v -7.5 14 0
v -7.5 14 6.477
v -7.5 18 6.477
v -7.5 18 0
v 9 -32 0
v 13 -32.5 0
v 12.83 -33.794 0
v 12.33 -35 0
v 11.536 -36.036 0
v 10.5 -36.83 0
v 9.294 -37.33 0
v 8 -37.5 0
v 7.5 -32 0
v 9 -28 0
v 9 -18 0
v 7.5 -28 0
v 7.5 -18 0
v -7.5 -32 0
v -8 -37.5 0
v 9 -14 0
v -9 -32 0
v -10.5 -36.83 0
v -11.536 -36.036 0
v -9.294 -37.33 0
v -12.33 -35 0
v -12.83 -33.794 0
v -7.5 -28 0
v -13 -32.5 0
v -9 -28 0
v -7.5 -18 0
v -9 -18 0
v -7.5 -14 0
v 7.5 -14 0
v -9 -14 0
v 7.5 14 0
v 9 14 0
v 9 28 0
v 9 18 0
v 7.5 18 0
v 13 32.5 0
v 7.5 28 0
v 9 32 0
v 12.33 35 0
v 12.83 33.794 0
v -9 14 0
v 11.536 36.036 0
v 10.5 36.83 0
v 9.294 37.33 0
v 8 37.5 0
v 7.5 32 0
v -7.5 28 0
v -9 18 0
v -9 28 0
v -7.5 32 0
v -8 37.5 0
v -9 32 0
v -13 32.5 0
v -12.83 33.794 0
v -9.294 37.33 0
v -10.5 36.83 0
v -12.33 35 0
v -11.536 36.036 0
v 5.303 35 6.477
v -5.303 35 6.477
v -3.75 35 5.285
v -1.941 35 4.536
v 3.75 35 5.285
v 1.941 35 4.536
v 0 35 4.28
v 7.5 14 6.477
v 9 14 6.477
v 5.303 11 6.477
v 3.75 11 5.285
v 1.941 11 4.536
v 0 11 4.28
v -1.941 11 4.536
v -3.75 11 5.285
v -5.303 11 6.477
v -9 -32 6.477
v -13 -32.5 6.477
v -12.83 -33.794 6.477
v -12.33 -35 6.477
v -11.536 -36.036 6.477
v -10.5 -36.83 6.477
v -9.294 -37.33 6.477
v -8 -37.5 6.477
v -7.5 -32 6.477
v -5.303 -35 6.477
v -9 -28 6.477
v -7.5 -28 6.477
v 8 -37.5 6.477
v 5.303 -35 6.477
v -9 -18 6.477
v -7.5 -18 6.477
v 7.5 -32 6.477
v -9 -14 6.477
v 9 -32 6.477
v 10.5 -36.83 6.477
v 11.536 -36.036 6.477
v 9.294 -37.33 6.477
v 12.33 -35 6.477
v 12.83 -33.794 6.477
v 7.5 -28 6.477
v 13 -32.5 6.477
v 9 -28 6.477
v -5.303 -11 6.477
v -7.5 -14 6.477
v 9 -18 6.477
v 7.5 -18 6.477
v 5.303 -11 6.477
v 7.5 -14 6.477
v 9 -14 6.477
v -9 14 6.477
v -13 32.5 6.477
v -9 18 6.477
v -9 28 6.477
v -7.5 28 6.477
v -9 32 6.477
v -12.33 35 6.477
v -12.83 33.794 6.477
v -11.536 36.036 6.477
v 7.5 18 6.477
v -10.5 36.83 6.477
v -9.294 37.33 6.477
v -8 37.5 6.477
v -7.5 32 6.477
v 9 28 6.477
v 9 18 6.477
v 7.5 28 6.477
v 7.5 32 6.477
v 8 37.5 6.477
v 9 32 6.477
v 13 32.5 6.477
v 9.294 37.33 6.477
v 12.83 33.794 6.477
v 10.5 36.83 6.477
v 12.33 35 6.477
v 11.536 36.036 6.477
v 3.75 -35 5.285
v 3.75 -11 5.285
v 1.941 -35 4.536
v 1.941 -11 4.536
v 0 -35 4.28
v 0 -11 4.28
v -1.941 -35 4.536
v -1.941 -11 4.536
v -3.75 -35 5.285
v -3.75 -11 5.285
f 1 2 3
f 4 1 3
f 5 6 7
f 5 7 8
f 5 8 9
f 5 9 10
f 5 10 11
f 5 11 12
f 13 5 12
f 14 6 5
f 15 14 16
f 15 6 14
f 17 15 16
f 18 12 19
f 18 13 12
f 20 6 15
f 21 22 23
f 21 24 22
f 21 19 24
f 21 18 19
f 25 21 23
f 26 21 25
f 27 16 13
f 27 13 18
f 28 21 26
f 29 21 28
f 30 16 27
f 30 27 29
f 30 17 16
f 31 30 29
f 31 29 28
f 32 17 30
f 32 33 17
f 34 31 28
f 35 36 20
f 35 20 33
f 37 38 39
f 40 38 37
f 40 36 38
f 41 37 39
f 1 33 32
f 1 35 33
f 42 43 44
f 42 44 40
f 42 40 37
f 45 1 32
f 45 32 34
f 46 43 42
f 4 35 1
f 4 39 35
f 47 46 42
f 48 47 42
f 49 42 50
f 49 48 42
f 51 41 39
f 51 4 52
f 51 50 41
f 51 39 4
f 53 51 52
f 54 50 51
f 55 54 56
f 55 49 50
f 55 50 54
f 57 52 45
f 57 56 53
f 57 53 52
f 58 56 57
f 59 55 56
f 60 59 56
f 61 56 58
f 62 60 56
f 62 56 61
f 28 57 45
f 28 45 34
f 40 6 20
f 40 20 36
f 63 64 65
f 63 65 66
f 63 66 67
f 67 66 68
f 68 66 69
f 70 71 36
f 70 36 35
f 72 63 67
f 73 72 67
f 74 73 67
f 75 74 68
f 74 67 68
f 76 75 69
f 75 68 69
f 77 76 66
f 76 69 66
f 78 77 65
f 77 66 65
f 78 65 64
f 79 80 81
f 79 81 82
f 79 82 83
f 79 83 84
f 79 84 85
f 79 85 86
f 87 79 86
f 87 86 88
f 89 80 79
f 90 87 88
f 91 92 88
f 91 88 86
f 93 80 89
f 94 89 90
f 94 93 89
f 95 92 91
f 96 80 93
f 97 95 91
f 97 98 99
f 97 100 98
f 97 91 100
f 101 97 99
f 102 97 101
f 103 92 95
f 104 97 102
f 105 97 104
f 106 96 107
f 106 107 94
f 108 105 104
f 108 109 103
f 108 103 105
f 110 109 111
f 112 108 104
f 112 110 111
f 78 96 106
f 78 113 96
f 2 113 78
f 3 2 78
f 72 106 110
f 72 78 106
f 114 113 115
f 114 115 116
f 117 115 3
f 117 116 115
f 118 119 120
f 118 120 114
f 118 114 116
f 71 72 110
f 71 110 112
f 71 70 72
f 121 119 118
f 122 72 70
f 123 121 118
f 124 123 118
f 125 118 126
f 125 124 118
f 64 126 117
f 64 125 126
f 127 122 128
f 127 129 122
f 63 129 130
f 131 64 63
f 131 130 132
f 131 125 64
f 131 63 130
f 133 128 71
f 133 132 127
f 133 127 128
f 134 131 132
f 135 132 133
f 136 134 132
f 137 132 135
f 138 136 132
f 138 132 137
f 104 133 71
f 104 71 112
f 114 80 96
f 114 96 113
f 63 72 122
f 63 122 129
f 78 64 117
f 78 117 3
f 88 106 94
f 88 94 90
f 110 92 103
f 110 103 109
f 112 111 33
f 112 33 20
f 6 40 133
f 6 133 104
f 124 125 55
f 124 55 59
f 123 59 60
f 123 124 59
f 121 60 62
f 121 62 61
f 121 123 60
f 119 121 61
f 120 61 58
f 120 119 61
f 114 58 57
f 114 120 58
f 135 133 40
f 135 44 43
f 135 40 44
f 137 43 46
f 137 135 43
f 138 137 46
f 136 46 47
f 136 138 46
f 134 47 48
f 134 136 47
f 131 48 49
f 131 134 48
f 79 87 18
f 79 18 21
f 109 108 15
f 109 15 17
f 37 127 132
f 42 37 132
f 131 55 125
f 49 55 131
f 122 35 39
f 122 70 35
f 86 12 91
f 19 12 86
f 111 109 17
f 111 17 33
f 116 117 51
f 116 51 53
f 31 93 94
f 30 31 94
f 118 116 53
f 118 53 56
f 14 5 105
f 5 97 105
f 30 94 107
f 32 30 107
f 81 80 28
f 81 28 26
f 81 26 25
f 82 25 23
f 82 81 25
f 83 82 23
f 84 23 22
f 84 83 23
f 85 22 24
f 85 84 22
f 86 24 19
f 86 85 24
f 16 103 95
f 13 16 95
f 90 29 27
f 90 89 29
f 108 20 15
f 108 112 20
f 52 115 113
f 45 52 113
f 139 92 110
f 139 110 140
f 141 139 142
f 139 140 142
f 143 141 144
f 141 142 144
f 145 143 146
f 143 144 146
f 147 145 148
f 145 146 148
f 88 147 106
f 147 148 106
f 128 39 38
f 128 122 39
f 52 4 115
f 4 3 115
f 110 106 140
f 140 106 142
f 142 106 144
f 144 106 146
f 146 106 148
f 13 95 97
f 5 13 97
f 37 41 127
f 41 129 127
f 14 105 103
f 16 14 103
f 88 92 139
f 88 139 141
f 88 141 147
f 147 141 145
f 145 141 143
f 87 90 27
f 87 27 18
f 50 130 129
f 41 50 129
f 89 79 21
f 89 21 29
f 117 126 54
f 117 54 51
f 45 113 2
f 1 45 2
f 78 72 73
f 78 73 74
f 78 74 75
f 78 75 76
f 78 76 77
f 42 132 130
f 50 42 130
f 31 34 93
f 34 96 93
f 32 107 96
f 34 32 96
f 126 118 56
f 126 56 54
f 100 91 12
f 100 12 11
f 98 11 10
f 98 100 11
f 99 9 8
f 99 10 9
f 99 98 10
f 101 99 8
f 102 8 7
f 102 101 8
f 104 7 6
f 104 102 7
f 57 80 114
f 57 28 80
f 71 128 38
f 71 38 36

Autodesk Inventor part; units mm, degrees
ref_plane "YZ Plane" through (0, 0, 0) normal (1, 0, 0) x (0, 1, 0)
ref_plane "XZ Plane" through (0, 0, 0) normal (0, 1, 0) x (-1, 0, 0)
ref_plane "XY Plane" through (0, 0, 0) normal (0, 0, 1) x (1, 0, 0)
sketch "Sketch1" plane through (0, 0, 0) normal (0, 0, 1) x (1, 0, 0)
  line L0 (-13, 37.5) -> (13, 37.5)
  line L1 (13, 37.5) -> (13, -37.5)
  line L2 (13, -37.5) -> (-13, -37.5)
  line L3 (-13, -37.5) -> (-13, 37.5)
  point P0 (0, 0)
  point P1 (-13, 0)
  point P2 (0, 37.5)
  dimension "d0" = 26
  dimension "d2" = 75
extrude "Extrusion1" add sketch "Sketch1" along normal blind 6.477
sketch "Sketch2" plane through (0, 0, 6.477) normal (0, 0, 1) x (1, 0, 0)
  line L0 (13, 37.5) -> (-13, 37.5) projected
  line L1 (-5.3033, 35) -> (5.3033, 35)
  line L2 (5.3033, 35) -> (5.3033, 11)
  line L3 (5.3033, 11) -> (-5.3033, 11)
  line L4 (-5.3033, 11) -> (-5.3033, 35)
  circle A0 centre (0, 35) radius 7.5
  line L5 (0, 35) -> (5.3033, 29.6967)
  point P0 (0, 0)
  point P1 (0, 37.5)
  dimension "d7" = 15
  dimension "d5" = 35
  dimension "d6" = 45
  dimension "d8" = 24
extrude "Extrusion2" cut sketch "Sketch2" against normal through all contours A0 L2 L3 L4 | L4 L1 L5 A0 | L5 L1 L2
sketch "Sketch3" plane through (0, 0, 6.477) normal (0, 0, 1) x (1, 0, 0)
  line L0 (-5.3033, 11) -> (-5.3033, 35) projected
  line L1 (-5.3033, 35) -> (5.3033, 35) projected
  line L2 (-7.5, 28) -> (7.5, 28) construction
  line L3 (7.5, 28) -> (7.5, 18) construction
  line L4 (7.5, 18) -> (-7.5, 18) construction
  line L5 (-7.5, 18) -> (-7.5, 28) construction
  line L6 (-7.5, 28) -> (-9, 28)
  line L7 (-9, 28) -> (-9, 32)
  line L8 (-9, 32) -> (-7.5, 32)
  line L9 (-7.5, 32) -> (-7.5, 28)
  line L10 (7.5, 28) -> (9, 28)
  line L11 (9, 28) -> (9, 32)
  line L12 (9, 32) -> (7.5, 32)
  line L13 (7.5, 32) -> (7.5, 28)
  line L14 (7.5, 18) -> (9, 18)
  line L15 (9, 18) -> (9, 14)
  line L16 (9, 14) -> (7.5, 14)
  line L17 (7.5, 14) -> (7.5, 18)
  line L18 (-7.5, 18) -> (-9, 18)
  line L19 (-9, 18) -> (-9, 14)
  line L20 (-9, 14) -> (-7.5, 14)
  line L21 (-7.5, 14) -> (-7.5, 18)
  point P0 (0, 0)
  point P1 (0, 28)
  point P2 (0, 35)
  point P3 (-7.5, 23)
  point P4 (-5.3033, 23)
  point P5 (-7.5, 30)
  dimension "d11" = 4
  dimension "d13" = 1.5
  dimension "d14" = 15
  dimension "d15" = 5
extrude "Extrusion3" cut sketch "Sketch3" against normal through all
mirror "Mirror1" about plane through (0, 0, 0) normal (0, 1, 0) of "Extrusion3", "Extrusion2"
sketch "Sketch4" plane through (-5.3033, 35, 6.477) normal (0, -1, 0) x (1, 0, 0)
  line L0 (10.6066, -6.477) -> (0, -6.477) projected
  line L1 (10.6066, 0) -> (10.6066, -6.477) projected
  line L2 (0, 0) -> (10.6066, 0) projected
  line L3 (0, 0) -> (0, -6.477) projected
  arc A0 (0, 0) -> (10.6066, 0) centre (5.3033, 5.3033) ccw
  point P0 (5.3033, -6.477)
  dimension "d18" = 15
extrude "Extrusion4" add sketch "Sketch4" along normal up to surface (70 mm away) contours L0 L3 A0 L1
fillet "Fillet1" radius 5 4 edges at (13, -37.5, 3.2385) (13, 37.5, 3.2385) (-13, 37.5, 3.2385) (-13, -37.5, 3.2385)
properties part number "Y BEARING BLOCK"
